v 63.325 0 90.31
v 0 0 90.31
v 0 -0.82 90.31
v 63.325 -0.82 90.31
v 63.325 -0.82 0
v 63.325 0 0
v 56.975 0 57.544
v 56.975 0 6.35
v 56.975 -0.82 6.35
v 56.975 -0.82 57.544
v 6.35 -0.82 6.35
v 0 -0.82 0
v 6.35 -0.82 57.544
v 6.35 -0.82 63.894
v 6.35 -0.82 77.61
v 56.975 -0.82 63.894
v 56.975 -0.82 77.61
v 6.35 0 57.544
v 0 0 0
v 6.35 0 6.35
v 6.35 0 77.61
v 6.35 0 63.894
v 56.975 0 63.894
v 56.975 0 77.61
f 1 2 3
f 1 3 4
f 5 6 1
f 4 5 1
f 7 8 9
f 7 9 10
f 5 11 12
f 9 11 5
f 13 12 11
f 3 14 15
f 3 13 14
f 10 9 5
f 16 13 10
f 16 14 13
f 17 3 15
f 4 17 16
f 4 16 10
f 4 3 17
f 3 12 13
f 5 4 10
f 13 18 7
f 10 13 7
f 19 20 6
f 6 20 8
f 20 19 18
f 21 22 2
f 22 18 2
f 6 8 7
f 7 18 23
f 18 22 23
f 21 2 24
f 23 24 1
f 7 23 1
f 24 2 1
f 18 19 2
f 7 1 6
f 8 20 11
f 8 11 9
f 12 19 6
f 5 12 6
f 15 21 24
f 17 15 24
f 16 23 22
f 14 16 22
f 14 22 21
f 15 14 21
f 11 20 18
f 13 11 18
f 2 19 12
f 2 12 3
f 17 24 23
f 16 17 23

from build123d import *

# Parameters (mm, degrees)
F0_W     = 63.325
F0_H     = 90.31
F0_W_2   = 50.625042
F0_H_2   = 51.194
F1_DEPTH = 0.82


with BuildPart() as f1:
    # F0 (on Front) → F1 (new body)
    with BuildSketch(Plane.XZ):
        with Locations((31.6625, 45.155)):
            Rectangle(F0_W, F0_H)
        with Locations((31.662521, 31.947)):
            Rectangle(F0_W_2, F0_H_2, mode=Mode.SUBTRACT)
        Polygon((6.34999, 63.894056), (6.349968, 77.610057), (56.97501, 77.610057), (56.975032, 63.894056), align=None, mode=Mode.SUBTRACT)
    extrude(amount=F1_DEPTH)


solid = f1.part
